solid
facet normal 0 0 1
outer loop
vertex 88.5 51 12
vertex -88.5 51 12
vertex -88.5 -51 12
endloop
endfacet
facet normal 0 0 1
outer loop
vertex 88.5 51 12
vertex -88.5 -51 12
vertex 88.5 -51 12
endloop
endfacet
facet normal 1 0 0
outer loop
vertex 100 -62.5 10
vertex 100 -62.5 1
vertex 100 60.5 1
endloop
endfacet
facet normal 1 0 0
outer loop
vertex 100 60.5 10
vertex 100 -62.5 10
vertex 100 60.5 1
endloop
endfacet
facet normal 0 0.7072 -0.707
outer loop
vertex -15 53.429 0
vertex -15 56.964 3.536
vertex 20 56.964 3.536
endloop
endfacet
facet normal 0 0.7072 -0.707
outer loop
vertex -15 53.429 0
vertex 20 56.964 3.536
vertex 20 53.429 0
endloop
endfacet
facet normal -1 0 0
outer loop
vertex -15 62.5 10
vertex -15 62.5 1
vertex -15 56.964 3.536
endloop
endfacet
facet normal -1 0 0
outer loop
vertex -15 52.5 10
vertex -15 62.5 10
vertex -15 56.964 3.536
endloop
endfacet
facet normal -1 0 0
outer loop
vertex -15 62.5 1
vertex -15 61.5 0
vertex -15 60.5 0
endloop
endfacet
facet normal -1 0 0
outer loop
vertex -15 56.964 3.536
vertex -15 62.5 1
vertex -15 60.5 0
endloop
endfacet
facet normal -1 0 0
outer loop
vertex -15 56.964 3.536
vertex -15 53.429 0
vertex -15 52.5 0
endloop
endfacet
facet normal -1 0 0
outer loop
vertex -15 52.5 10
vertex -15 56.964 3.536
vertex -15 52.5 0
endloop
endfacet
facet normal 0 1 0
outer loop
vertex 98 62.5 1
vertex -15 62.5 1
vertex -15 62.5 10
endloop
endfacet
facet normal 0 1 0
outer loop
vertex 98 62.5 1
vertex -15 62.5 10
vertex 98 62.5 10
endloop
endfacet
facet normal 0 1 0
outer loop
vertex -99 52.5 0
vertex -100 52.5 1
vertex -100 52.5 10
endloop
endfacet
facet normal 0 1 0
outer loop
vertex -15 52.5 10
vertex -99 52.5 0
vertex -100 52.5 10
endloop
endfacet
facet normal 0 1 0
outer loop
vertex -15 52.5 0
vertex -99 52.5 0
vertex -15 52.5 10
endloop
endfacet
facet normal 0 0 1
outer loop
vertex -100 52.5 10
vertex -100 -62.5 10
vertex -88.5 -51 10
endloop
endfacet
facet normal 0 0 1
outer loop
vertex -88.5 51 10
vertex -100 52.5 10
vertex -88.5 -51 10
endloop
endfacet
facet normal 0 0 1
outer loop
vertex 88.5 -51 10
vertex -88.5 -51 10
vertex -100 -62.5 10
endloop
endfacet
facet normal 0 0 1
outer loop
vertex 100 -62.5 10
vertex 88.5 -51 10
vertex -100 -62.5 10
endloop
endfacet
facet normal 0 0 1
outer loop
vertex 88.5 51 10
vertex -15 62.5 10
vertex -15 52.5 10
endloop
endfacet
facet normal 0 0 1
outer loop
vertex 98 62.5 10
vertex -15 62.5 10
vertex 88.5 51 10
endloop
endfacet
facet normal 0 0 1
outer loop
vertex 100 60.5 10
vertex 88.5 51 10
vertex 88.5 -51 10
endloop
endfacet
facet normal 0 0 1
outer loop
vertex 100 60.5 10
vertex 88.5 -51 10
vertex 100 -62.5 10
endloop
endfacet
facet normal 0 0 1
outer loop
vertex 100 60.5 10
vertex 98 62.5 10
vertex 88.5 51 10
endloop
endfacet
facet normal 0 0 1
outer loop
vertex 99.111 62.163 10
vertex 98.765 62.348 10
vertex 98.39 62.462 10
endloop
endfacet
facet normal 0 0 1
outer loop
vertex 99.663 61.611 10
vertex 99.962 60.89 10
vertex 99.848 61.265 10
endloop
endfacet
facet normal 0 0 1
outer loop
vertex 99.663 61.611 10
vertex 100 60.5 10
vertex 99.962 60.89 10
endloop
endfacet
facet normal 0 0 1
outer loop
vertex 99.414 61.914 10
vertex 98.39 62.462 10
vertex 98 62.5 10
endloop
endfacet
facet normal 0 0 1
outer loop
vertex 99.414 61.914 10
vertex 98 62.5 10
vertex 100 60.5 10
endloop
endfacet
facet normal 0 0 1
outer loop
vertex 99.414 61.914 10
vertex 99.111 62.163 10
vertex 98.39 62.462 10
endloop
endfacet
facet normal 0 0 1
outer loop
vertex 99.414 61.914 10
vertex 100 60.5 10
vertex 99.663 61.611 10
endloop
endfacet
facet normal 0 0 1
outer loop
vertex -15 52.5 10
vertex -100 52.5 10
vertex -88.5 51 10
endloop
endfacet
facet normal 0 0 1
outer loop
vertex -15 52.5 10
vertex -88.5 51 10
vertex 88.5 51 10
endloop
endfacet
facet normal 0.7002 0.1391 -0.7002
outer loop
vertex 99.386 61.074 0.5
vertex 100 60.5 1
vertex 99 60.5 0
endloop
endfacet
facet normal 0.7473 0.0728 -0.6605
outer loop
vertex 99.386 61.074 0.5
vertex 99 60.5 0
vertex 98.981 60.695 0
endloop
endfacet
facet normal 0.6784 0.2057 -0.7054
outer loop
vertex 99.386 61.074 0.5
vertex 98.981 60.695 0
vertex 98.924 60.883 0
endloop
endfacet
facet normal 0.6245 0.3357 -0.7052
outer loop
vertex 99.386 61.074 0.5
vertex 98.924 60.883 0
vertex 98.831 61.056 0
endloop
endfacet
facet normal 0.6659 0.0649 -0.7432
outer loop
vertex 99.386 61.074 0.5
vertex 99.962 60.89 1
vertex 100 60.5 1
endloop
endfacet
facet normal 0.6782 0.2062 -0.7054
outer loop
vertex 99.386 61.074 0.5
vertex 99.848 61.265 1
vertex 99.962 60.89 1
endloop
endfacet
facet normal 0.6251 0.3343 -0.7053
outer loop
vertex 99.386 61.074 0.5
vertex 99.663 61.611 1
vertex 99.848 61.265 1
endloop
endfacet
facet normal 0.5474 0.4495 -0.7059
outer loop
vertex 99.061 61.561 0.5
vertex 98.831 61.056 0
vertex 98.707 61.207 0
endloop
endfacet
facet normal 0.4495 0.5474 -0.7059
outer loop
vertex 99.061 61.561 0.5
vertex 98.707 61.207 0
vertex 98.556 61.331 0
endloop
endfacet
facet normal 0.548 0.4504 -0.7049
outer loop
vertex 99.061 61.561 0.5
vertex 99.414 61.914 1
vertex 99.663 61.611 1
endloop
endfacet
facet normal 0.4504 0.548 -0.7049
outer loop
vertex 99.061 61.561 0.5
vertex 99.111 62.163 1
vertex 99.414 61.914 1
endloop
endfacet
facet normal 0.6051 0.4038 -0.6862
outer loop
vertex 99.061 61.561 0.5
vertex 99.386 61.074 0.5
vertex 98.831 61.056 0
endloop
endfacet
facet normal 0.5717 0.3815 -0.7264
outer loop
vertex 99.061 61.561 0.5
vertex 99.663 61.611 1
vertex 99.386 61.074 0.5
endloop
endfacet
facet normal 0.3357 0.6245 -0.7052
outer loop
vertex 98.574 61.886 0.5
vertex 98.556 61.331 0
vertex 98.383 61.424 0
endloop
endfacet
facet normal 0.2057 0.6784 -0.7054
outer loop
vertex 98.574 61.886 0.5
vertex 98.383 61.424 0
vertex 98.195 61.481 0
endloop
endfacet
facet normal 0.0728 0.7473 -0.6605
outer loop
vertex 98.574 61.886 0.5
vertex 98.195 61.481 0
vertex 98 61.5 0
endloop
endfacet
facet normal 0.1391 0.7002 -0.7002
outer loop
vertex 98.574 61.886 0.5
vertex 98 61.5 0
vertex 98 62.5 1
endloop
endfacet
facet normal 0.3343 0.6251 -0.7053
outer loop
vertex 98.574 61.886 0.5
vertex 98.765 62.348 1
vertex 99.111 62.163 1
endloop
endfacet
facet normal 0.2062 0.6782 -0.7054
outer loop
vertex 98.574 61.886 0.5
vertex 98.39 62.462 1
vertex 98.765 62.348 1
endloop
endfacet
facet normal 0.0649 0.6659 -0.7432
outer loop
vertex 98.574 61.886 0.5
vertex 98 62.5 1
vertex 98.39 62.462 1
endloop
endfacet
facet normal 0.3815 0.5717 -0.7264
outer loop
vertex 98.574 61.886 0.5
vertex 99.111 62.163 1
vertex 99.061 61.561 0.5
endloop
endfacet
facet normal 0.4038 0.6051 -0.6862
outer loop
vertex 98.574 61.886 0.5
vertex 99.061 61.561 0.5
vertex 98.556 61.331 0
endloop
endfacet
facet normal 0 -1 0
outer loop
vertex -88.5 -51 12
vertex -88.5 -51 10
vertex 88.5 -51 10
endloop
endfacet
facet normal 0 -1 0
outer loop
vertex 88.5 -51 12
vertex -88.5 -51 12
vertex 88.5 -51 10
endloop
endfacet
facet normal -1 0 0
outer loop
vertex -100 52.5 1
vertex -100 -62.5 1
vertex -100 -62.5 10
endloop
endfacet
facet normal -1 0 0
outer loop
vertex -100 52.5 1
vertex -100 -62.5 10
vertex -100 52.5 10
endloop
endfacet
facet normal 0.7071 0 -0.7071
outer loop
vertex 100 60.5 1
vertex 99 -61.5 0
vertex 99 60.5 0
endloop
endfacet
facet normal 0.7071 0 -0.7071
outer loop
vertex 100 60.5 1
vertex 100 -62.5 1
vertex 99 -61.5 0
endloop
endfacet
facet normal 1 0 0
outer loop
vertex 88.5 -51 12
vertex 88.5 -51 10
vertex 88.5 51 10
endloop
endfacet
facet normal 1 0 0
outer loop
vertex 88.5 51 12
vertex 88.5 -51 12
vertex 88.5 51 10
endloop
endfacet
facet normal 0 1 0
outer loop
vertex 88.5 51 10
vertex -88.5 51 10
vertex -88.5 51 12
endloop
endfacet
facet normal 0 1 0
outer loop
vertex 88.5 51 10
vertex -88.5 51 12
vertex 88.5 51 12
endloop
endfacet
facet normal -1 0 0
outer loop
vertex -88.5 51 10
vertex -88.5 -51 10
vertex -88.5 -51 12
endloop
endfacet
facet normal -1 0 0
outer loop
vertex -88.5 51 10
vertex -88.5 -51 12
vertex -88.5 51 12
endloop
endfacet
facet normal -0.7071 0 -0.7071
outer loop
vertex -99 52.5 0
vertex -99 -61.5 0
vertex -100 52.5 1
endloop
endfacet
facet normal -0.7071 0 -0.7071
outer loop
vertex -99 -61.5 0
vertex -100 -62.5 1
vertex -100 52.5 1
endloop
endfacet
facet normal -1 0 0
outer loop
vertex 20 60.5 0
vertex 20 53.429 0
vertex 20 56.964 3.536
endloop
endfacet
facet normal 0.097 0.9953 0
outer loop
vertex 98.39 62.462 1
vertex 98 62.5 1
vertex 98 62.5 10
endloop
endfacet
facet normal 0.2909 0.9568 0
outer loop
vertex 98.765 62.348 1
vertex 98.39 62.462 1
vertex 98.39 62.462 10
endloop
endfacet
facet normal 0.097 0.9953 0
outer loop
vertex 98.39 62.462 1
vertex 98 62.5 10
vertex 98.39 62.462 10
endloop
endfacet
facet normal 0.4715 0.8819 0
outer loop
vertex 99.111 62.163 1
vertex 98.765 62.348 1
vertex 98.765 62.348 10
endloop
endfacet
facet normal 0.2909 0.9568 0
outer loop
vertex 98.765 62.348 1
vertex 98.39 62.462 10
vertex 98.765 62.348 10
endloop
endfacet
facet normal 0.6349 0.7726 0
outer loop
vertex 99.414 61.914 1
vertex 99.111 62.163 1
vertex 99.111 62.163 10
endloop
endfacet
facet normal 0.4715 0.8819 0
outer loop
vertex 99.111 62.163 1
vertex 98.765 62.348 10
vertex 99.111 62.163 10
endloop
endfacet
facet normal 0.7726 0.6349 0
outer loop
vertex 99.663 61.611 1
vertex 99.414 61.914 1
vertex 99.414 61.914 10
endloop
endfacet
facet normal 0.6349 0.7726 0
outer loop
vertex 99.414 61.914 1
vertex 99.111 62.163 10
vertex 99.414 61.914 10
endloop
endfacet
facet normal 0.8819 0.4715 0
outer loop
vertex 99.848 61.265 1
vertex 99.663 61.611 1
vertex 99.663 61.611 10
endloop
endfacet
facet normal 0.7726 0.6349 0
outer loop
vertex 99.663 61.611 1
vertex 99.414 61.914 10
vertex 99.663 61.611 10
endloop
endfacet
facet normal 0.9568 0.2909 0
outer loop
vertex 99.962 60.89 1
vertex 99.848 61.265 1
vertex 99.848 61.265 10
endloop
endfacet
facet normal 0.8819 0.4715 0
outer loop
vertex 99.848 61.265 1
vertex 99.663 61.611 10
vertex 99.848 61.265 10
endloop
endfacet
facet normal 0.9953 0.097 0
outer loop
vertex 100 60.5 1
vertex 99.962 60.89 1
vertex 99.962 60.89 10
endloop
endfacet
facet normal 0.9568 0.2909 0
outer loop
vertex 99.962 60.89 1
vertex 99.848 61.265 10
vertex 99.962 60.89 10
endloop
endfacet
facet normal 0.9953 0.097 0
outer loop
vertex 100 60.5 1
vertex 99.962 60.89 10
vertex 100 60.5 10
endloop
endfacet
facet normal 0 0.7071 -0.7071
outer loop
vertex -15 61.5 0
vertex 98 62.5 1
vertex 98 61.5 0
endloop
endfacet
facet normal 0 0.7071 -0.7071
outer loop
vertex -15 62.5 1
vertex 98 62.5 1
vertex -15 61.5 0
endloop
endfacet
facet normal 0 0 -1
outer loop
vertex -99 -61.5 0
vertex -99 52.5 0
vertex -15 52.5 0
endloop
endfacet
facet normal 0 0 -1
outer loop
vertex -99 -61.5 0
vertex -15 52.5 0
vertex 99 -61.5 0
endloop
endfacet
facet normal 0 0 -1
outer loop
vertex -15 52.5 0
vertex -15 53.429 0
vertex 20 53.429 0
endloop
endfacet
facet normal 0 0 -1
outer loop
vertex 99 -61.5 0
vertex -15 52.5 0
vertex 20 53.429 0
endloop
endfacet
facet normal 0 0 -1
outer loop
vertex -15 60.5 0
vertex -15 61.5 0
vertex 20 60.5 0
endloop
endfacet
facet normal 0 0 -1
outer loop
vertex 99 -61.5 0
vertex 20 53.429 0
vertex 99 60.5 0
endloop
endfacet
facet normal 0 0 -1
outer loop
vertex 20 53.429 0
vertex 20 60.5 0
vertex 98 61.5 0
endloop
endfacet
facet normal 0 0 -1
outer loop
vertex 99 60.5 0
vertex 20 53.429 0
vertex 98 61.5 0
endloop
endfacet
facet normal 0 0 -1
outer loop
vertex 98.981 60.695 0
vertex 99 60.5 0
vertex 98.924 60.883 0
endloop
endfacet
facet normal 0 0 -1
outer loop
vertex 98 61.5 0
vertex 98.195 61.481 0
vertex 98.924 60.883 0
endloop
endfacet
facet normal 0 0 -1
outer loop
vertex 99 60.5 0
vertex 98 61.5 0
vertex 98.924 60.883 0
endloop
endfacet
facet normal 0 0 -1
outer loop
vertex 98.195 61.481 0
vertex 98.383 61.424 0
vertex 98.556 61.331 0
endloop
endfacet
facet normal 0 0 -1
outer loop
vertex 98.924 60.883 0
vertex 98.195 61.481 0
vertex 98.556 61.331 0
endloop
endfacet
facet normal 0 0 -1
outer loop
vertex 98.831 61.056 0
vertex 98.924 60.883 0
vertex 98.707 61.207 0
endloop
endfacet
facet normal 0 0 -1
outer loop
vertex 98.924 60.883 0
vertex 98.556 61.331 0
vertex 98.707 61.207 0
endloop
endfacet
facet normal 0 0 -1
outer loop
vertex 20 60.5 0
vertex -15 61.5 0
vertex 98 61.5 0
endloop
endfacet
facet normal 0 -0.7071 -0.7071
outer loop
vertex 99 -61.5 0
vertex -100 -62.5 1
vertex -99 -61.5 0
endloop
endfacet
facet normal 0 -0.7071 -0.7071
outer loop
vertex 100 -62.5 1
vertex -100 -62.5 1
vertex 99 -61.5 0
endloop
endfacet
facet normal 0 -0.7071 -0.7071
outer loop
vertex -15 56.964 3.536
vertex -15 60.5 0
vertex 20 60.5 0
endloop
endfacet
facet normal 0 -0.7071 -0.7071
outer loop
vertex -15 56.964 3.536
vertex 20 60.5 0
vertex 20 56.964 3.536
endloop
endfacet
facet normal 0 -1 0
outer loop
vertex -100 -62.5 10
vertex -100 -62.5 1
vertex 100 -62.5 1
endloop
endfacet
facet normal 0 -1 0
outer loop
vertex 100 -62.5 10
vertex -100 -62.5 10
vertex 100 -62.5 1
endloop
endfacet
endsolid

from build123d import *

# Parameters (mm, degrees)
SKETCH_W        = 200
SKETCH_H        = 125
PAD_DEPTH       = 10
SKETCH001_W     = 177
SKETCH001_H     = 102
PAD001_DEPTH    = 2
POCKET_DEPTH    = 120
SKETCH003_W     = 85
SKETCH003_H     = 10
POCKET001_DEPTH = 12.001
FILLET_R        = 2
CHAMFER_SIZE    = 1
CHAMFER001_SIZE = 1
CHAMFER002_SIZE = 1


with BuildPart() as part:
    # Sketch → Pad (new body)
    with BuildSketch(Plane.XY):
        Rectangle(SKETCH_W, SKETCH_H)
    extrude(amount=PAD_DEPTH)

    # Sketch001 (on Face6 of Pad) → Pad001 (join)
    with BuildSketch(Plane.XY.offset(10)):
        Rectangle(SKETCH001_W, SKETCH001_H)
    extrude(amount=PAD001_DEPTH)

    # Sketch002 (on Face2 of Pad001) → Pocket (cut)
    with BuildSketch(Plane(origin=(-100, 0, 0), x_dir=(0, -1, 0), z_dir=(-1, 0, 0))):
        Polygon((-60.5, 0), (-56.964466, 3.535534), (-53.428932, 0), (-56.964466, -3.535534), align=None)
    extrude(amount=-POCKET_DEPTH, mode=Mode.SUBTRACT)

    # Sketch003 (on Face4 of Pocket) → Pocket001 (cut, through all)
    with BuildSketch(Plane(origin=(0, 0, 0), x_dir=(1, 0, 0), z_dir=(0, 0, -1))):
        with Locations((-57.5, -57.5)):
            Rectangle(SKETCH003_W, SKETCH003_H)
    extrude(amount=-POCKET001_DEPTH, mode=Mode.SUBTRACT)

    # Fillet
    fillet_edges = [part.edges().sort_by_distance(p)[0] for p in [
        (100, 62.5, 5),
    ]]
    fillet(fillet_edges, radius=FILLET_R)

    # Chamfer
    chamfer_edges = [part.edges().sort_by_distance(p)[0] for p in [
        (100, -1, 0),
    ]]
    chamfer(chamfer_edges, length=CHAMFER_SIZE)

    # Chamfer001
    chamfer001_edges = [part.edges().sort_by_distance(p)[0] for p in [
        (-100, -5, 0),
    ]]
    chamfer(chamfer001_edges, length=CHAMFER001_SIZE)

    # Chamfer002
    chamfer002_edges = [part.edges().sort_by_distance(p)[0] for p in [
        (0, -62.5, 0),
    ]]
    chamfer(chamfer002_edges, length=CHAMFER002_SIZE)


solid = part.part
